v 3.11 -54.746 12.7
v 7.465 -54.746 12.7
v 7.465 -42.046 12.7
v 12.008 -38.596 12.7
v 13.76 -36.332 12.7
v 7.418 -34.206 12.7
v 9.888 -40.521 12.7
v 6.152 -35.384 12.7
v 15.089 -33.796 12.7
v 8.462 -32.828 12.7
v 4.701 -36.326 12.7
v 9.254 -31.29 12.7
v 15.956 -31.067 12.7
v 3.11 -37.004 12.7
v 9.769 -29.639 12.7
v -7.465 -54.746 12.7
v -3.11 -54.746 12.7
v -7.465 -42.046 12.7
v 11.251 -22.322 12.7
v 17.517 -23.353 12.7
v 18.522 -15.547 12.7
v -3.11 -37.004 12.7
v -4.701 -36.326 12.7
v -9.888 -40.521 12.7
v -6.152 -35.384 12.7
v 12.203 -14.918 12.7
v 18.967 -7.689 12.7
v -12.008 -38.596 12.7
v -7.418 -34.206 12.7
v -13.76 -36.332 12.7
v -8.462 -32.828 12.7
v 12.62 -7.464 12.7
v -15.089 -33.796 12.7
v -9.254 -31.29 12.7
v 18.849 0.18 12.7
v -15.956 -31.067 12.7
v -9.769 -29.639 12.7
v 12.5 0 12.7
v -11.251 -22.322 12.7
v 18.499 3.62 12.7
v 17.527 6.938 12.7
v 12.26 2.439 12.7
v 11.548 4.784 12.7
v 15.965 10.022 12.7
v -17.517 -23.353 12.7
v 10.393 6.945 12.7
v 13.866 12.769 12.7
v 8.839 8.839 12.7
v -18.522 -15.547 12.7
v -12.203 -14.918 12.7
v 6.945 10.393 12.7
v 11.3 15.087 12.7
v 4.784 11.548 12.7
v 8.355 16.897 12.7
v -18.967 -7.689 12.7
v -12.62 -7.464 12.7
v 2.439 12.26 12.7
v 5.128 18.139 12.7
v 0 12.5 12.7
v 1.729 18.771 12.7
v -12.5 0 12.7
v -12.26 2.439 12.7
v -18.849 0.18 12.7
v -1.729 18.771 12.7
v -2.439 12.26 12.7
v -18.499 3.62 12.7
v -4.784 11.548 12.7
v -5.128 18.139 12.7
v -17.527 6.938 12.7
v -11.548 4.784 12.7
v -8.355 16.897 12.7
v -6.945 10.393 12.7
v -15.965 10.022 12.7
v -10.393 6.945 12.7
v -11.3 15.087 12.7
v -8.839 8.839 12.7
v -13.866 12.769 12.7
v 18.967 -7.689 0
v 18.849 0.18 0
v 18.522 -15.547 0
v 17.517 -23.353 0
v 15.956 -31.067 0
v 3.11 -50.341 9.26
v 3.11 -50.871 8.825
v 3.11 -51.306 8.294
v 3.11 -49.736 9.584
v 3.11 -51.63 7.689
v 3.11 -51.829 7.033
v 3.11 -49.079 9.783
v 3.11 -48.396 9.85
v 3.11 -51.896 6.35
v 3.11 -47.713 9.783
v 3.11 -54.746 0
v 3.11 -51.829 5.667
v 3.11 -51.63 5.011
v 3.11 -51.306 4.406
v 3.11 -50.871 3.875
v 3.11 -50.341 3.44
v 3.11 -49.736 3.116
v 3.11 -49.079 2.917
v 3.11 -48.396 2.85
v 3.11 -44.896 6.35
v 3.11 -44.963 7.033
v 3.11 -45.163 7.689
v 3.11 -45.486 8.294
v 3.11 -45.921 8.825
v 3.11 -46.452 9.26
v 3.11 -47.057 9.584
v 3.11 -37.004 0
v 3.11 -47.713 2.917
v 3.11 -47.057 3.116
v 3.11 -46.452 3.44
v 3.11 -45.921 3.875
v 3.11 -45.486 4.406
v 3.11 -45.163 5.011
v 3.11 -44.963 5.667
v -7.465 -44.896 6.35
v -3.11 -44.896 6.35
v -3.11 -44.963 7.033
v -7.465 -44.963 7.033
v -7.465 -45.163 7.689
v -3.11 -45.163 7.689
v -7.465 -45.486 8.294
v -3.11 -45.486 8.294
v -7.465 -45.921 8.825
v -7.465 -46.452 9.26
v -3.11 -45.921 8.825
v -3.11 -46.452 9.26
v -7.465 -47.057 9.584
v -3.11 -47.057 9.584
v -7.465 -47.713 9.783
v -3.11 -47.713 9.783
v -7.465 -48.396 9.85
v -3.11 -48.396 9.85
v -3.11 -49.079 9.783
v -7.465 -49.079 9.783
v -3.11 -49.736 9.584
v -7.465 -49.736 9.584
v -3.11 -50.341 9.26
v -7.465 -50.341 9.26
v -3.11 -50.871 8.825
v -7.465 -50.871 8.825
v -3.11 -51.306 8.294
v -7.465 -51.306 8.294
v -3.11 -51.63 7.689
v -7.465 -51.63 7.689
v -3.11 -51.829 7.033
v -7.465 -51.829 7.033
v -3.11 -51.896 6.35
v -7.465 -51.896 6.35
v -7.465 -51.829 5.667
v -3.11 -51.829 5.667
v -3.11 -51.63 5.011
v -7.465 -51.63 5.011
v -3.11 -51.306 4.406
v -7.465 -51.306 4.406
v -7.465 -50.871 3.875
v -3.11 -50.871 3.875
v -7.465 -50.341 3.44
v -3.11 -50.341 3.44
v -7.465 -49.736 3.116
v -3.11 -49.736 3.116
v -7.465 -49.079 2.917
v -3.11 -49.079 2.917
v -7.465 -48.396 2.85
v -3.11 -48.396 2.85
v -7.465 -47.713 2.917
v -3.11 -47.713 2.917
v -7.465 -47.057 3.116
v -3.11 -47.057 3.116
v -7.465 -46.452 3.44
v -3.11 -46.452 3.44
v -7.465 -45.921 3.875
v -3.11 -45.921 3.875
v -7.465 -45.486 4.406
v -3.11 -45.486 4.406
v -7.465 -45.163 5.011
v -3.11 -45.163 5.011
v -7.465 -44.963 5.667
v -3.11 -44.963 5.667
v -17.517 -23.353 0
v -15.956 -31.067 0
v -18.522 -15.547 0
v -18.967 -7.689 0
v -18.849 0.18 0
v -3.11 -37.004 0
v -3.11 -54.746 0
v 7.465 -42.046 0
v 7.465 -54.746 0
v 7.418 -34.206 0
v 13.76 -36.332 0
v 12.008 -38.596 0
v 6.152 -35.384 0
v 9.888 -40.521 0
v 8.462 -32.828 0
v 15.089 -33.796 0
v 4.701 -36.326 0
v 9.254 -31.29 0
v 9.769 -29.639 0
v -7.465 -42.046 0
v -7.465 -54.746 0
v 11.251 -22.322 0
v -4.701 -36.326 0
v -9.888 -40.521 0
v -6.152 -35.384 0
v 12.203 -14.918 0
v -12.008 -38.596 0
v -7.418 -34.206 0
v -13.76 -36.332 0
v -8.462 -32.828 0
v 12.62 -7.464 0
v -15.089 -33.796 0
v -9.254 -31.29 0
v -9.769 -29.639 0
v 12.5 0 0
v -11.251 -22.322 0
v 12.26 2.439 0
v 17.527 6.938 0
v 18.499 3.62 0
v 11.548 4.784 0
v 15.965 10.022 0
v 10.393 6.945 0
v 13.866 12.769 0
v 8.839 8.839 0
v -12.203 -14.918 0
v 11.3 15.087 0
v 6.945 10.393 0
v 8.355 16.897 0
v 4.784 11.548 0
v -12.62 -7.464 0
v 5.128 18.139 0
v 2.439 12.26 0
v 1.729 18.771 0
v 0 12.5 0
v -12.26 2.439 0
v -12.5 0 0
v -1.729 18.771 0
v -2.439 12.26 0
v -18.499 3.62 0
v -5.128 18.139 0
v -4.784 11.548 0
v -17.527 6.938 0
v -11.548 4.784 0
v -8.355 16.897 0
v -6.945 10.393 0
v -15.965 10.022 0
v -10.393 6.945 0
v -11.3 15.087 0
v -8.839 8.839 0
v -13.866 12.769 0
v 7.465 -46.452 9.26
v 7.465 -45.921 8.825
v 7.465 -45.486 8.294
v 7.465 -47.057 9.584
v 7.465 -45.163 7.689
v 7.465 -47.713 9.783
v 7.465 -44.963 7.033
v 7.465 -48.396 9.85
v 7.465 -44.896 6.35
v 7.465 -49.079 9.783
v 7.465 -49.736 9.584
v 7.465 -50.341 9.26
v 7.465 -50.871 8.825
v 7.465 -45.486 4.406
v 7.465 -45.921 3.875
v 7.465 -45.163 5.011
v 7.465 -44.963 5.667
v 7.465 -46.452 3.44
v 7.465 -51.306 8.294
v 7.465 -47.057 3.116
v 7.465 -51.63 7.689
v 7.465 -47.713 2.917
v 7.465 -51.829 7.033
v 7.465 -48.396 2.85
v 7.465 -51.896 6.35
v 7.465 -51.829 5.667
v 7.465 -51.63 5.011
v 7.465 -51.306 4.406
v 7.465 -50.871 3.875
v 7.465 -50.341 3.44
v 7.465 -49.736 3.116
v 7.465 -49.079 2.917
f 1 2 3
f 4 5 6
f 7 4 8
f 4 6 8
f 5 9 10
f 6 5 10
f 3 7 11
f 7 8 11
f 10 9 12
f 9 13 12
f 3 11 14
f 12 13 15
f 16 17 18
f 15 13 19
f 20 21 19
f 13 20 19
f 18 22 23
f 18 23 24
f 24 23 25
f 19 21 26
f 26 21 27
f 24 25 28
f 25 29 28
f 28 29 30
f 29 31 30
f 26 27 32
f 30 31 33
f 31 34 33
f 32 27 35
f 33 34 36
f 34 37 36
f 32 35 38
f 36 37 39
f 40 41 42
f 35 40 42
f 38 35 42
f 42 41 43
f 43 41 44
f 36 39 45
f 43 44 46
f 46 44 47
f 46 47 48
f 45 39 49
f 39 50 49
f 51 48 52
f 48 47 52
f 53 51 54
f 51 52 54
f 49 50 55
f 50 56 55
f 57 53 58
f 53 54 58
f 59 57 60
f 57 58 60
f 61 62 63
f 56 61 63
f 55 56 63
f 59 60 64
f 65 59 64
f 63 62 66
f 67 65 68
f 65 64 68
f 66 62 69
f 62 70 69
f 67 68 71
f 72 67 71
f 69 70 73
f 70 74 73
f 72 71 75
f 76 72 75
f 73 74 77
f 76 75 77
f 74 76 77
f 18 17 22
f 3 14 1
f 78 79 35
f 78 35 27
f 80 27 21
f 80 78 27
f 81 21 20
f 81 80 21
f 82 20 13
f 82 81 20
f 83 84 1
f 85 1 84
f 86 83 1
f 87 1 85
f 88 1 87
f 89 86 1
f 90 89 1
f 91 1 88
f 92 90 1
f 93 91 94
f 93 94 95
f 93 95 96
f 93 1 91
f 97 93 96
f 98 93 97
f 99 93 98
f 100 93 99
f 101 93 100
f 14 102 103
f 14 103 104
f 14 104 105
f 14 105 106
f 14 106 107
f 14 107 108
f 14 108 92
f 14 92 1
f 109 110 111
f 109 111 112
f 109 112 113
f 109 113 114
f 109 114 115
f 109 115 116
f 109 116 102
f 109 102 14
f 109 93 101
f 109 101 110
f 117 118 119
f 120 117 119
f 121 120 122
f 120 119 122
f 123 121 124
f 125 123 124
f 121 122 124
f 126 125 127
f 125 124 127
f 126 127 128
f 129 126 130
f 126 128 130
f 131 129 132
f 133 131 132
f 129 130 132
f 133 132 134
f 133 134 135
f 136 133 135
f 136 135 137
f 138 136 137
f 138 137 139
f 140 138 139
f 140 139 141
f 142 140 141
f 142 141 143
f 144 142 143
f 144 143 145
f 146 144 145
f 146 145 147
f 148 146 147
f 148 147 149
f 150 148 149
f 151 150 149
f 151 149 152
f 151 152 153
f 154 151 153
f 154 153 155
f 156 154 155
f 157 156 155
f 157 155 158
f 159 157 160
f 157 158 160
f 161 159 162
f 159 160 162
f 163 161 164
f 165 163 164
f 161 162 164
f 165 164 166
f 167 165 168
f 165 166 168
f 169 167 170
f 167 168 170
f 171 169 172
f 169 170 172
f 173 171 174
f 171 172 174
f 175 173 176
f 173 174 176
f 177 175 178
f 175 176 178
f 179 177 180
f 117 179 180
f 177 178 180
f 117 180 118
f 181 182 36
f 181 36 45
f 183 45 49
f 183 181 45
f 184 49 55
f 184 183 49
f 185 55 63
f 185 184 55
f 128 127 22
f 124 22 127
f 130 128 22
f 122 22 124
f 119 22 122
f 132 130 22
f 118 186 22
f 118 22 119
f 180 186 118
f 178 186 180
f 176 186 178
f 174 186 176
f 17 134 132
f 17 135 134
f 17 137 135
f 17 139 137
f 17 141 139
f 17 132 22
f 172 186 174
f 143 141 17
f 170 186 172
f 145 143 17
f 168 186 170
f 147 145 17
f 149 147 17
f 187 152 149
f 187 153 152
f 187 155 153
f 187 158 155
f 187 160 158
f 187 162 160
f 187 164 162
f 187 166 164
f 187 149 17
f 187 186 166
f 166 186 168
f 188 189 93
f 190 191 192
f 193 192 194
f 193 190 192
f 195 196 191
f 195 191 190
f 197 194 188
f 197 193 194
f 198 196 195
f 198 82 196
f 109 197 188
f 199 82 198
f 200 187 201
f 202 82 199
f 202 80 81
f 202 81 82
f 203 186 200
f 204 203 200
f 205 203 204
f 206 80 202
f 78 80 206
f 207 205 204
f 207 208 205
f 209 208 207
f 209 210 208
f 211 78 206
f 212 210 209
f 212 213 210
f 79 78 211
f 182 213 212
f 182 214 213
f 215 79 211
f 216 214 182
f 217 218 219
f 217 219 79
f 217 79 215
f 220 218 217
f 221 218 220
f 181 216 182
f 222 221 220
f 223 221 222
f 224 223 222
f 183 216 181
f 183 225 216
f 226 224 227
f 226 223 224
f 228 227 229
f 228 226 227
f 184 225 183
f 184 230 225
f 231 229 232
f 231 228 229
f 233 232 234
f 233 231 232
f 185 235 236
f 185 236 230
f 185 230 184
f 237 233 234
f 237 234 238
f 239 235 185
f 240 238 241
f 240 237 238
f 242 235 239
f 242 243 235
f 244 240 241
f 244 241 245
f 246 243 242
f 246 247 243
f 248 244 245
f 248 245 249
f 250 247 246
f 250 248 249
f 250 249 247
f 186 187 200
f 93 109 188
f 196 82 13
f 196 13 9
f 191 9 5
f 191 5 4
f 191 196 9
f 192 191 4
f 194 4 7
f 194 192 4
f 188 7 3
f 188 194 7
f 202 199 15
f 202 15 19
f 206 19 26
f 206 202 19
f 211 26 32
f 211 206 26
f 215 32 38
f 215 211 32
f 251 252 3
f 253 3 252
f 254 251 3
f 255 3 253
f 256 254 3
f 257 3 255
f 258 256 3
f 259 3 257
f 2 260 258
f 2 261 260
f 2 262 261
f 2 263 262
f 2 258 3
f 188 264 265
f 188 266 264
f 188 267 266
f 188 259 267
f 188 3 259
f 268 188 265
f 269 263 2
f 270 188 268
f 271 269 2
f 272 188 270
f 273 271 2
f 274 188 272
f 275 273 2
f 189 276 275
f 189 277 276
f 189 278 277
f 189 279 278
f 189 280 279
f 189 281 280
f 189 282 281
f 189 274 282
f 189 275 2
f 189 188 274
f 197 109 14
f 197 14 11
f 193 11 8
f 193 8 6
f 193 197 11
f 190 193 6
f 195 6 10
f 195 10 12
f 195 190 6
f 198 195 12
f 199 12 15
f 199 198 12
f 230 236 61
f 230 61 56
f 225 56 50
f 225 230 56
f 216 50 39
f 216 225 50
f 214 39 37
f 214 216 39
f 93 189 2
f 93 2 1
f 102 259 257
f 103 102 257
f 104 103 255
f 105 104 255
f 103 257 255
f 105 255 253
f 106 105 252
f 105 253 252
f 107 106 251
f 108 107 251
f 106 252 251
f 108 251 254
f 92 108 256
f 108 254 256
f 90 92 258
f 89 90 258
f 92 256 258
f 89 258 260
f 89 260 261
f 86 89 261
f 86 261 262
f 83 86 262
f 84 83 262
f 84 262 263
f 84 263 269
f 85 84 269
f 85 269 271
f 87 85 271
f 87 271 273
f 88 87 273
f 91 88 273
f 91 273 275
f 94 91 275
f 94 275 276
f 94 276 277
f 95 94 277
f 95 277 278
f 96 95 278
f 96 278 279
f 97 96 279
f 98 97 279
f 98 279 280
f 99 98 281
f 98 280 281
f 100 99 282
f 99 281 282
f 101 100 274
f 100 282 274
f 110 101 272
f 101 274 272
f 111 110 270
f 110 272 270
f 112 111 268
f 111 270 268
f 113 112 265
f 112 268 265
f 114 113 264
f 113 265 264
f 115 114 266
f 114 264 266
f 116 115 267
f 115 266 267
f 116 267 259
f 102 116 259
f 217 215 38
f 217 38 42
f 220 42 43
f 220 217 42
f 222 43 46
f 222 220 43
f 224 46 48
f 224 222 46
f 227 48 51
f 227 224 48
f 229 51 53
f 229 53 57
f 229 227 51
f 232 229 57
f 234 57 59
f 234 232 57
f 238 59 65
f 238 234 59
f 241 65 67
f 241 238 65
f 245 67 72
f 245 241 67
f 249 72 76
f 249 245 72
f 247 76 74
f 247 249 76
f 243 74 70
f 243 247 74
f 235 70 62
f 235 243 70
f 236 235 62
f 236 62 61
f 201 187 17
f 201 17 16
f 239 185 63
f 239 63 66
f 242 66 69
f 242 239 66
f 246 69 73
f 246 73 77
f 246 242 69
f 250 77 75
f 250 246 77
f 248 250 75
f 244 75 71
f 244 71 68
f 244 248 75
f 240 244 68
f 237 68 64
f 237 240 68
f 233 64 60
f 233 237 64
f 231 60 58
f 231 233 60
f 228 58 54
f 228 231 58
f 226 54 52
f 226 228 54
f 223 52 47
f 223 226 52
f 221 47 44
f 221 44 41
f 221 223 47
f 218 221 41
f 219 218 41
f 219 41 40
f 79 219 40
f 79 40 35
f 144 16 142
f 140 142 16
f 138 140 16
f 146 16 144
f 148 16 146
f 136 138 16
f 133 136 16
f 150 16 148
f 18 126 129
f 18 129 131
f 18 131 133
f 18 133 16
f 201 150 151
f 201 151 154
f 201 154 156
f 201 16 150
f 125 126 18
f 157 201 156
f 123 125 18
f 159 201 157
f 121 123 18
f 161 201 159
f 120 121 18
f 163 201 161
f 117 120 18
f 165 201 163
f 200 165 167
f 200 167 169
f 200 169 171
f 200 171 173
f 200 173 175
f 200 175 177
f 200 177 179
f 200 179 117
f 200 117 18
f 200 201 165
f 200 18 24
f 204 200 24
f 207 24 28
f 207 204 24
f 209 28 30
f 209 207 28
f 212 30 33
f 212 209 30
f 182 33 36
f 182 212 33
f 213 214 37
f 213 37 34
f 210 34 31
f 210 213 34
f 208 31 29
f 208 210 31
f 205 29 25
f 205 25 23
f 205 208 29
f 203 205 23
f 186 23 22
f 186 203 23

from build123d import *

# Parameters (mm, degrees)
BOSS_EXTRUDE1_DEPTH = 12.7
SKETCH2_R           = 3.499999985
CUT_EXTRUDE1_DEPTH  = 127


with BuildPart() as part:
    # Sketch1 → Boss-Extrude1 (new body)
    with BuildSketch(Plane.XY):
        with BuildLine():
            Line((-3.110307402, -37.00399852), (-3.110307402, -54.746228005))
            Line((-3.110307402, -54.746228005), (-7.465236153, -54.746228005))
            Line((-7.465236153, -54.746228005), (-7.465236153, -42.046228005))
            ThreePointArc((-7.465236153, -42.046228005), (-12.933427118, -37.502447849), (-15.956082844, -31.067340787))
            ThreePointArc((-15.956082844, -31.067340787), (-18.522349701, -15.547297089), (-18.849139709, 0.180089543))
            ThreePointArc((-18.849139709, 0.180089543), (0, 18.85), (18.849139709, 0.180089543))
            ThreePointArc((18.849139709, 0.180089543), (18.522349701, -15.547297089), (15.956082844, -31.067340787))
            ThreePointArc((15.956082844, -31.067340787), (12.933427118, -37.502447849), (7.465236153, -42.046228005))
            Line((7.465236153, -42.046228005), (7.465236153, -54.746228005))
            Line((7.465236153, -54.746228005), (3.110307402, -54.746228005))
            Line((3.110307402, -54.746228005), (3.110307402, -37.00399852))
            ThreePointArc((3.110307402, -37.00399852), (7.417993382, -34.206219068), (9.768536138, -29.639088993))
            ThreePointArc((9.768536138, -29.639088993), (12.203438759, -14.918076577), (12.5, 0))
            ThreePointArc((12.5, 0), (0, 12.5), (-12.5, 0))
            ThreePointArc((-12.5, 0), (-12.203438759, -14.918076577), (-9.768536138, -29.639088993))
            ThreePointArc((-9.768536138, -29.639088993), (-7.417993382, -34.206219068), (-3.110307402, -37.00399852))
        make_face()
    extrude(amount=BOSS_EXTRUDE1_DEPTH)

    # Sketch2 → Cut-Extrude1 (cut)
    with BuildSketch(Plane(origin=(7.465236153, 0, 0), x_dir=(0, 0, -1), z_dir=(1, 0, 0))):
        with Locations(Location((-6.35, -48.396228005, 0), (0, 0, 90))):
            Circle(SKETCH2_R)
    extrude(amount=-CUT_EXTRUDE1_DEPTH, mode=Mode.SUBTRACT)


solid = part.part
